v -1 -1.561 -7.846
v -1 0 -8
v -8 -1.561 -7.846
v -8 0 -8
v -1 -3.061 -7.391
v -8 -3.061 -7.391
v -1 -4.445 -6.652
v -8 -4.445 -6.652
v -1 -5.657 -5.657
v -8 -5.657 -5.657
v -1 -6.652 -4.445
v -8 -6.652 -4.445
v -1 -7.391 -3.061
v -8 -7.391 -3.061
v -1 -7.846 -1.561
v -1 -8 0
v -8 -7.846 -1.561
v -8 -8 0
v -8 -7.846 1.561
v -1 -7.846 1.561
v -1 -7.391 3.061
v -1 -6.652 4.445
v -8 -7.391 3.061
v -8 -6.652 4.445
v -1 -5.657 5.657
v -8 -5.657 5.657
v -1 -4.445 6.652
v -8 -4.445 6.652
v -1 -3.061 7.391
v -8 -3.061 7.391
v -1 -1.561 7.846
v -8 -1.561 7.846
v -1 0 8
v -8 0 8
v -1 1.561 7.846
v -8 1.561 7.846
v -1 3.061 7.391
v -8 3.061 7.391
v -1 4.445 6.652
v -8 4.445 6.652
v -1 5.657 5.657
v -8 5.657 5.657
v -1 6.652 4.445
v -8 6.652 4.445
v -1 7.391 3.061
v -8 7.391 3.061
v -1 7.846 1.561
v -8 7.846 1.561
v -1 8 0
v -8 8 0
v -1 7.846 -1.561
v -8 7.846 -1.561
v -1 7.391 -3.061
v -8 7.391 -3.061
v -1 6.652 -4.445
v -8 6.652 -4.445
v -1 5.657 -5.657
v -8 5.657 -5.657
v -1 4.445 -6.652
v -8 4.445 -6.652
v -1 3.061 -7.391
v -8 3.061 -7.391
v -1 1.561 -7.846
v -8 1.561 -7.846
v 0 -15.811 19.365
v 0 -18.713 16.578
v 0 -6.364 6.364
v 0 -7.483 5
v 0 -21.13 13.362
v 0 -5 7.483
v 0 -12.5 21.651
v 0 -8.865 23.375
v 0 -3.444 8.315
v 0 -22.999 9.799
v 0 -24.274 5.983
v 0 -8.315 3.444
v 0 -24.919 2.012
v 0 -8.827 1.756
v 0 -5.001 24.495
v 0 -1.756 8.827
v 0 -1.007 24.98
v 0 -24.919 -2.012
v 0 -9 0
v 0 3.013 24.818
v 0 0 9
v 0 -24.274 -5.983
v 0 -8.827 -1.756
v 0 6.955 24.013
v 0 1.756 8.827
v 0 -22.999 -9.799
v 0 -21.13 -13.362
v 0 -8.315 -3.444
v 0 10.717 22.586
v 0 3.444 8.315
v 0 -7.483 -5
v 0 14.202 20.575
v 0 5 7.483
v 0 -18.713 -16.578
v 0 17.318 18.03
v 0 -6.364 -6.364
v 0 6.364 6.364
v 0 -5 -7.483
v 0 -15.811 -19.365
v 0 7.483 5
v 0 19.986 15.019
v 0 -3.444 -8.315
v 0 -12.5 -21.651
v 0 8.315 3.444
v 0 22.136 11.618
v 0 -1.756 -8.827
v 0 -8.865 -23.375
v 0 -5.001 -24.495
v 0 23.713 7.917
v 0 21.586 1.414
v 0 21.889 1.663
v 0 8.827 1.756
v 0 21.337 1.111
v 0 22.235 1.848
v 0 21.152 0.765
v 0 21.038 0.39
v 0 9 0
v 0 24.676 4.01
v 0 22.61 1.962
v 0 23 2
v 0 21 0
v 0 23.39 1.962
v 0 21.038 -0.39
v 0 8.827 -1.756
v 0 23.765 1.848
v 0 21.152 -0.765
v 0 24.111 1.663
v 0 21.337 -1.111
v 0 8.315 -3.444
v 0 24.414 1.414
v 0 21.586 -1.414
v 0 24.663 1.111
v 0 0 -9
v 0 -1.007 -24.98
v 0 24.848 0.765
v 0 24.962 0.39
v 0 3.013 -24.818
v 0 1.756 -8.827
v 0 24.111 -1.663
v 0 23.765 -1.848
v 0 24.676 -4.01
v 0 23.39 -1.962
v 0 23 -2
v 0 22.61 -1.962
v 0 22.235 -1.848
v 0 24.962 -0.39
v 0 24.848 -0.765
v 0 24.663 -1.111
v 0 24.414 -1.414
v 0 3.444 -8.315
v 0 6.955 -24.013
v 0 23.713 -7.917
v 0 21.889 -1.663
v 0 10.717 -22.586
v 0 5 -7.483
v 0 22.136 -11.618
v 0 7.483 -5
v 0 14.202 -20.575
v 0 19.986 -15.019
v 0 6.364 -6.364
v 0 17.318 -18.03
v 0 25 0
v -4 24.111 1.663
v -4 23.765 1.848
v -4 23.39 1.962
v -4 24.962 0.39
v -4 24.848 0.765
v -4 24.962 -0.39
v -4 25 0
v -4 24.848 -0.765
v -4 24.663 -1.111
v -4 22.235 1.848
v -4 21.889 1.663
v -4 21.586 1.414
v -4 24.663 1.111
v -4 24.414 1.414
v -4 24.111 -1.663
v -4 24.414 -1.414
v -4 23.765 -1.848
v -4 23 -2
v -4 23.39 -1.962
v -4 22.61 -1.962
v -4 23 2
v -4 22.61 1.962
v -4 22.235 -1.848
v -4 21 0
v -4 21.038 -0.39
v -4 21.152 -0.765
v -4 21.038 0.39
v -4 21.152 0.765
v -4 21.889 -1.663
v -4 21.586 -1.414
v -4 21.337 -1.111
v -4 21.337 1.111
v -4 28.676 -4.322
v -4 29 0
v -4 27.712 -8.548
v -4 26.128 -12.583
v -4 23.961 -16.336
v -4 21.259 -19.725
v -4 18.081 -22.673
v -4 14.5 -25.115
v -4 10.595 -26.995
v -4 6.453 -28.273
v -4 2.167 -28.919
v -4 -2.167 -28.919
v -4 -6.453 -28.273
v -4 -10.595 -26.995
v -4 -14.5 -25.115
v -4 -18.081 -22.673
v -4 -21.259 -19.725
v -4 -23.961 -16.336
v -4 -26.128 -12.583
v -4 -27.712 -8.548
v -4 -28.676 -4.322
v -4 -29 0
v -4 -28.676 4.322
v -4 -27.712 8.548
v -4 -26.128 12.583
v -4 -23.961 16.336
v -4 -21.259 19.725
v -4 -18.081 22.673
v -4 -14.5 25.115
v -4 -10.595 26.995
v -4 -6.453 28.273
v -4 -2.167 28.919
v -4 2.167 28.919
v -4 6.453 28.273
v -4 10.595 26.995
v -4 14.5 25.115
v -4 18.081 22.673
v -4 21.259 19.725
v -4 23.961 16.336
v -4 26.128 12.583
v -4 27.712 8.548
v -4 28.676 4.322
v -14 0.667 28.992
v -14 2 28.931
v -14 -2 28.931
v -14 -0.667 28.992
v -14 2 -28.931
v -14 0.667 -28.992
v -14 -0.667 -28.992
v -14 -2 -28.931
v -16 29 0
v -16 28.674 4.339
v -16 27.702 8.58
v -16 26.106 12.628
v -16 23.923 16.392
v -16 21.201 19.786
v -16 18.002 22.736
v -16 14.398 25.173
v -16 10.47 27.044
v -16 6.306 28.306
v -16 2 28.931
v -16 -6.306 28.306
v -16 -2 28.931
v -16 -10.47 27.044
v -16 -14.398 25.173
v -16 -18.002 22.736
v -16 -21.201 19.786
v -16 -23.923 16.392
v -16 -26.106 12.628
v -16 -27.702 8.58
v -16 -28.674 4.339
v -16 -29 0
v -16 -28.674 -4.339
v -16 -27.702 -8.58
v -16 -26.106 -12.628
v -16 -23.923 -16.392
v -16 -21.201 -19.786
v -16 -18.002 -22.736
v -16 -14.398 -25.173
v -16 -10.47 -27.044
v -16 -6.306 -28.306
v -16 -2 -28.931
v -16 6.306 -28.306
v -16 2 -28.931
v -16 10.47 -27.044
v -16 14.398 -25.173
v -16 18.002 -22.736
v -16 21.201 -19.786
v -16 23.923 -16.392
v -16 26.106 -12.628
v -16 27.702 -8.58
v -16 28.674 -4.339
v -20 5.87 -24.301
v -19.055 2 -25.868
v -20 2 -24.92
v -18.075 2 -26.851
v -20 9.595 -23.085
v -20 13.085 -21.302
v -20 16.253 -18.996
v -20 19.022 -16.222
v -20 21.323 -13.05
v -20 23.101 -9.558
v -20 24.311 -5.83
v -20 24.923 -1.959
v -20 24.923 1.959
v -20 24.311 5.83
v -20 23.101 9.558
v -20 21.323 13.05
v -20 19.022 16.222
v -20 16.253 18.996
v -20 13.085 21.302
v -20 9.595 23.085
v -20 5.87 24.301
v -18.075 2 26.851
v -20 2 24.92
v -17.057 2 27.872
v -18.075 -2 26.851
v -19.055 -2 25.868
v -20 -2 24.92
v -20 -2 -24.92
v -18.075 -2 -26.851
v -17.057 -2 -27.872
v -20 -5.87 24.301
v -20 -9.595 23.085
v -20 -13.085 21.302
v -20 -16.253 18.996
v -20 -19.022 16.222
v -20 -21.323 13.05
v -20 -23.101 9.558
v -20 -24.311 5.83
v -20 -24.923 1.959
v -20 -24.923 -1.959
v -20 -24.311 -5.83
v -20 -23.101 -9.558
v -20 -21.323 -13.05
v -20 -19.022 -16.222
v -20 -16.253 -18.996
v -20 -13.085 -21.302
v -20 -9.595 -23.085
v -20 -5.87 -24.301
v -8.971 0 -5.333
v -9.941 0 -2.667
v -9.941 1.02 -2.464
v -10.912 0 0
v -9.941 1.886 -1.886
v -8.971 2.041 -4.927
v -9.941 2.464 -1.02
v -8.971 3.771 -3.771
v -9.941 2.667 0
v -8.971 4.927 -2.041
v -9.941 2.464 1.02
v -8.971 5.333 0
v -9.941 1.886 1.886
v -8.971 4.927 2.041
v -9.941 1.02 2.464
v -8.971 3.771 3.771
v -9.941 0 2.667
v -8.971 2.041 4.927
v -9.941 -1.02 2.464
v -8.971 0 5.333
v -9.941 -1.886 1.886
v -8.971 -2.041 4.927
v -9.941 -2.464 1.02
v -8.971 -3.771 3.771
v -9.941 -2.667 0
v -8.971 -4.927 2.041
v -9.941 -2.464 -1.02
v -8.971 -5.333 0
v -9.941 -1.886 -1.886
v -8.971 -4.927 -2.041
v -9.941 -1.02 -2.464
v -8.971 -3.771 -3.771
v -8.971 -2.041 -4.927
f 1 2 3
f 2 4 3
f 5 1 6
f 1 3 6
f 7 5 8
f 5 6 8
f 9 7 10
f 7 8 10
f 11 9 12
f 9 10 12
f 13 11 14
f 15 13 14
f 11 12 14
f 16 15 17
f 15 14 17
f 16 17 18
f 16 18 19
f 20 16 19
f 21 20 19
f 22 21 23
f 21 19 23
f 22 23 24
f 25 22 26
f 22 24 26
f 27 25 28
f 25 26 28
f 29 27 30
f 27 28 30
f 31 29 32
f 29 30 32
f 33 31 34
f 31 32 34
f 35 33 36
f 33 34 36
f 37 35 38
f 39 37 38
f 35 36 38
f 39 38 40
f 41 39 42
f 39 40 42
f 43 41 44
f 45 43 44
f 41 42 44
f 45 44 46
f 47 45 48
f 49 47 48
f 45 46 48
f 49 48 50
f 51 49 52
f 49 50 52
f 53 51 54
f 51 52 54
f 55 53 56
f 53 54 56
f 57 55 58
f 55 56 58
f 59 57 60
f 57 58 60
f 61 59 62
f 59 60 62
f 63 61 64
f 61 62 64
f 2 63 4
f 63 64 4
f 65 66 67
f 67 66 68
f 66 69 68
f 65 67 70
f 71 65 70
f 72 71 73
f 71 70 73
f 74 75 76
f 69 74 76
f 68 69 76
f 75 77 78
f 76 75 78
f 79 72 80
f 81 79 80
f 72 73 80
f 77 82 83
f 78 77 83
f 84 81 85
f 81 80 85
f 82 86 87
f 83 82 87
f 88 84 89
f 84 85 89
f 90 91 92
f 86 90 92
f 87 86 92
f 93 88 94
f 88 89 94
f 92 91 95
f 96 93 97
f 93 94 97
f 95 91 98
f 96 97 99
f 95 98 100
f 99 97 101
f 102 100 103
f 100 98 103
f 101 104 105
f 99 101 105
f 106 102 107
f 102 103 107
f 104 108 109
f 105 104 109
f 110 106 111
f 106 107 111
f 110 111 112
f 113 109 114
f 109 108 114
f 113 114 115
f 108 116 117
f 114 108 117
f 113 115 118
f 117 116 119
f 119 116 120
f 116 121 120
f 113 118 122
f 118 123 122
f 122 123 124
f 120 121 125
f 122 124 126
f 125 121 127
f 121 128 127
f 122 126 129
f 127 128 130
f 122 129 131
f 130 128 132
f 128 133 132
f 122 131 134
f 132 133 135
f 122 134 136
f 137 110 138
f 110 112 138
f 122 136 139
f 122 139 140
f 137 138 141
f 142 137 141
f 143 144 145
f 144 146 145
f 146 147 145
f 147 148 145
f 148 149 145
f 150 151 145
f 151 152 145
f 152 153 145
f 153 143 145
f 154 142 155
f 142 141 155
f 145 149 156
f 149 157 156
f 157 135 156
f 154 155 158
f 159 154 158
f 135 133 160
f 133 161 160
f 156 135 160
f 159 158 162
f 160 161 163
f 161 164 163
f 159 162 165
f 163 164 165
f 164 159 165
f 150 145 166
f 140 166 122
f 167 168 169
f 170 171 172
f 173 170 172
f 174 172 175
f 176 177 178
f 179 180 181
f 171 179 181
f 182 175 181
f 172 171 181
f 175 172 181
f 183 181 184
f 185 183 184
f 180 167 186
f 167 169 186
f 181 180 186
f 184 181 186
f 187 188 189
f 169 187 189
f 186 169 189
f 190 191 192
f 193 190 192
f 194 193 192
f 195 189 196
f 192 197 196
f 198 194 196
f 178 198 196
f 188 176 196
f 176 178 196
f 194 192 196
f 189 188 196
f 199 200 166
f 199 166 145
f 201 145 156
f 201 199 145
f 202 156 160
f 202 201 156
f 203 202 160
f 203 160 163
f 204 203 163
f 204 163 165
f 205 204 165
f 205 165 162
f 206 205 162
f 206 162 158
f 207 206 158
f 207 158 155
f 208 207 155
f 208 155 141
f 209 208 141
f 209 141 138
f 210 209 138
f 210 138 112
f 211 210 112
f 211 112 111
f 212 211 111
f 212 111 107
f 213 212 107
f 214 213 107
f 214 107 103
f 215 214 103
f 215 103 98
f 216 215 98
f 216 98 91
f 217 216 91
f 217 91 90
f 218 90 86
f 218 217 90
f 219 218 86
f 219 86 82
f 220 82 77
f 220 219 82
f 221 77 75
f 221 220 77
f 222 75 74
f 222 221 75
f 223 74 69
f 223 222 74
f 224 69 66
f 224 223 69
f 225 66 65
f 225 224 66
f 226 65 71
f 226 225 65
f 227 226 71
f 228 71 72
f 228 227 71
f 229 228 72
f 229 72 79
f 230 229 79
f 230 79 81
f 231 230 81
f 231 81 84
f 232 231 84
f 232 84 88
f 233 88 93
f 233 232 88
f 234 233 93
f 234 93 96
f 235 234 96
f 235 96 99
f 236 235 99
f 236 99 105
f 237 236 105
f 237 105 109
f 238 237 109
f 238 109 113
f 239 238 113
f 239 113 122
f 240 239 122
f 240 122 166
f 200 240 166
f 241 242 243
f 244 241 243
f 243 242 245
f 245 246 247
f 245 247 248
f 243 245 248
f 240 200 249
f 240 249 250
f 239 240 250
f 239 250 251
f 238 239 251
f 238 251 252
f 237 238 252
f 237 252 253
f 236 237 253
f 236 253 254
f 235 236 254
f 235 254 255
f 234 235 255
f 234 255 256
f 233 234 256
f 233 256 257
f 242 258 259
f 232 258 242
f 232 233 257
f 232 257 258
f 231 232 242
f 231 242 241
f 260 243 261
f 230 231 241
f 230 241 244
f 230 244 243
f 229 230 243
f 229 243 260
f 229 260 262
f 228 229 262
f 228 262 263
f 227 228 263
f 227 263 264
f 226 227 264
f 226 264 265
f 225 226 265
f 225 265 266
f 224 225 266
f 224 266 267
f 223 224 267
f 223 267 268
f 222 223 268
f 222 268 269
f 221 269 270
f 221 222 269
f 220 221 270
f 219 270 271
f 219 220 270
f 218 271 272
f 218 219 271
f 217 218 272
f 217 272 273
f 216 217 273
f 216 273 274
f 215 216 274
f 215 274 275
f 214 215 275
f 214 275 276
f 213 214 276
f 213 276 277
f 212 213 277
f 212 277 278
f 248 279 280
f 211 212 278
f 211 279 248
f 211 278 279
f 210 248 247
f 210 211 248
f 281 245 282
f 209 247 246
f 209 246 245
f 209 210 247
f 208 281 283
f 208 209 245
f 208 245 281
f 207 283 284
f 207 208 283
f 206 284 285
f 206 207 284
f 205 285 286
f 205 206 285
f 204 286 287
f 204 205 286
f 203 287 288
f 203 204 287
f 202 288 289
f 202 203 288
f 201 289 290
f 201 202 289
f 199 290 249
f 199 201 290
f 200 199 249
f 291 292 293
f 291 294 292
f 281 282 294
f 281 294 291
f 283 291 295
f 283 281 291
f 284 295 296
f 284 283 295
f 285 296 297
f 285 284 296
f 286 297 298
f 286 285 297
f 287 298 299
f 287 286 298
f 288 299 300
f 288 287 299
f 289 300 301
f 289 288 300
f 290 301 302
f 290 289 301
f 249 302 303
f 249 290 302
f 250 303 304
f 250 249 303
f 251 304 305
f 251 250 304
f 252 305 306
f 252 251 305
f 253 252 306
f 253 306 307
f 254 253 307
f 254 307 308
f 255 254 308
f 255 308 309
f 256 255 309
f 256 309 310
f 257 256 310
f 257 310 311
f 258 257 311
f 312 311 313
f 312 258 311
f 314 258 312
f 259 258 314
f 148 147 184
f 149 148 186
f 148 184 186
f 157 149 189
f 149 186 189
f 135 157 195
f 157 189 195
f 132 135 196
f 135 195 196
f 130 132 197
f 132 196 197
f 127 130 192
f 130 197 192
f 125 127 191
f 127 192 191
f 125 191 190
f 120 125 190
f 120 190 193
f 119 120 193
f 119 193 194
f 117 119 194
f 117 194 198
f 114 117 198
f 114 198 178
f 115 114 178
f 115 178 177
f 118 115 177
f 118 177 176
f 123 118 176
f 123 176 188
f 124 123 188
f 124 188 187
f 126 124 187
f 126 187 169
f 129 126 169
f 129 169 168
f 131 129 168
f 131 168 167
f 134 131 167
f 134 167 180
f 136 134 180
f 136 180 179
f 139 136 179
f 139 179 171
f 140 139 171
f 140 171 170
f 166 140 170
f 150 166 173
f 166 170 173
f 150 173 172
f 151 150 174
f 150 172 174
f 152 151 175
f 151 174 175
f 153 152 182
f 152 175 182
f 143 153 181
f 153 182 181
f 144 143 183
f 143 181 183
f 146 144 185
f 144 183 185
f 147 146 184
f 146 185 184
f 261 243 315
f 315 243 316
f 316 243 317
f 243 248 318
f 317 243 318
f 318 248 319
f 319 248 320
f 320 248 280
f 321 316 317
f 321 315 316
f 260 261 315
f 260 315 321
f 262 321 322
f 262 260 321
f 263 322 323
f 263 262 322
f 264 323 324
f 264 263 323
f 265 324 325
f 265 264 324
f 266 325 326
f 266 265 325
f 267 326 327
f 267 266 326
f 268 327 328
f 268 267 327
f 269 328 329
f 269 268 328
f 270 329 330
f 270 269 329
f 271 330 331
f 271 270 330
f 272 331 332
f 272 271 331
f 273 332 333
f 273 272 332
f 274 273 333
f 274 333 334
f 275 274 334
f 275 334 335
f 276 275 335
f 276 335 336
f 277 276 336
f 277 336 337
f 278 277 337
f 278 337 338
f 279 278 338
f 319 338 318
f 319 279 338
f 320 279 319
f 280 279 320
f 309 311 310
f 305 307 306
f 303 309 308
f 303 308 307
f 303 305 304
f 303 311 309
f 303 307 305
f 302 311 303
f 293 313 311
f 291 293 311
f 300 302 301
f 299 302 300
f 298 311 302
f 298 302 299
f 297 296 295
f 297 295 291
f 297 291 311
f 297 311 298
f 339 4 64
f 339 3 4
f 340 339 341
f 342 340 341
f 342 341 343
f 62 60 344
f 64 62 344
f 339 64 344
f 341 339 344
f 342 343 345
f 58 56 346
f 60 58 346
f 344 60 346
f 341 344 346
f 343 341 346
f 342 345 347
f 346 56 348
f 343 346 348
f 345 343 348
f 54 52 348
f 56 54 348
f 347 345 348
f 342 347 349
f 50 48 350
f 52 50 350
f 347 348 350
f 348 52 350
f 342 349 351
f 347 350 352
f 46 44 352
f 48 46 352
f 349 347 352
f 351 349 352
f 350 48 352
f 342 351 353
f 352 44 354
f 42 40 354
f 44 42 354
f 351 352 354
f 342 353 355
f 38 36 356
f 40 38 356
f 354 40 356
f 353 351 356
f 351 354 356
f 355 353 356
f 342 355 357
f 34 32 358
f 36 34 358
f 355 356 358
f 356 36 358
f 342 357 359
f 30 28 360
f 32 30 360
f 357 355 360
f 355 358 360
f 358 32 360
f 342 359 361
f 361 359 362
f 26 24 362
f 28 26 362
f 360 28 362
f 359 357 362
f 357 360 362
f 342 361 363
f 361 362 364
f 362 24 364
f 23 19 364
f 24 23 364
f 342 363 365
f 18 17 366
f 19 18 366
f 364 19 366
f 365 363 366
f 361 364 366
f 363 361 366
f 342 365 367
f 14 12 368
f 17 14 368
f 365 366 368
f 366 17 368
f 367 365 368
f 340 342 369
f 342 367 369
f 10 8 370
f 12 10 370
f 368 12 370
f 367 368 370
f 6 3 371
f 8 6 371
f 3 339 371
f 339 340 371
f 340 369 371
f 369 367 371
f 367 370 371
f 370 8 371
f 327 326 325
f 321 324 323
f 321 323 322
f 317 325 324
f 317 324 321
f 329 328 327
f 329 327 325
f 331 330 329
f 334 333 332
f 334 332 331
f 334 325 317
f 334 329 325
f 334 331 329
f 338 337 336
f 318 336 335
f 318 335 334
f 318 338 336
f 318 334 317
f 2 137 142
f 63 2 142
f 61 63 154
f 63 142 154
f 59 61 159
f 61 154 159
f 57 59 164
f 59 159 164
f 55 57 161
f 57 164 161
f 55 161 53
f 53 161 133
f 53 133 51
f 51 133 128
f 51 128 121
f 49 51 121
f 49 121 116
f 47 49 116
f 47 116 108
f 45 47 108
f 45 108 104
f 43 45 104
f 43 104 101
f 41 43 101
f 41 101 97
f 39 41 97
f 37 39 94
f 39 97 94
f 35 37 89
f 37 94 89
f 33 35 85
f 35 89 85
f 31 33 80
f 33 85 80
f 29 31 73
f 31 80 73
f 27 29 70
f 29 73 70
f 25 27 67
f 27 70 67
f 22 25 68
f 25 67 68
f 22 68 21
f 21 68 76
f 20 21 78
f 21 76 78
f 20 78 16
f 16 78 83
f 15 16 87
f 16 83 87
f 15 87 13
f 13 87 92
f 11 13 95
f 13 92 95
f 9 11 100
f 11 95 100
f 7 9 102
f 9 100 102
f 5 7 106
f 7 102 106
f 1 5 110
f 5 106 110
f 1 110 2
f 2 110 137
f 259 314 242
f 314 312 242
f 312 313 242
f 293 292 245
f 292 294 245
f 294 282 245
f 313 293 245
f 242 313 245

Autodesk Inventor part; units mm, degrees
ref_plane "YZ Plane" through (0, 0, 0) normal (1, 0, 0) x (0, 1, 0)
ref_plane "XZ Plane" through (0, 0, 0) normal (0, 1, 0) x (-1, 0, 0)
ref_plane "XY Plane" through (0, 0, 0) normal (0, 0, 1) x (1, 0, 0)
sketch "Эскиз5" plane through (0, 0, 0) normal (0, 0, 1) x (1, 0, 0)
  line L0 (0, 0) -> (-20, 0)
  line L1 (-20, 0) -> (-20, 25)
  line L2 (-16, 29) -> (-4, 29)
  line L3 (0, 25) -> (0, 0)
  line L4 (-4, 29) -> (0, 25)
  line L5 (-16, 29) -> (-20, 25)
  point P0 (-20, 29)
  point P1 (0, 29)
  dimension "d35" = 20
  dimension "d36" = 29
  dimension "d37" = 4
  dimension "d38" = 4
  dimension "d39" = 4
  dimension "d40" = 4
revolve "Вращение3" add sketch "Эскиз5" angle 360 about axis through (0, 0, 0) along (-1, 0, 0)
sketch "Эскиз6" plane through (0, 0, 0) normal (1, 0, 0) x (0, 0, -1)
  line L0 (0, 0) -> (0, 23) construction
  dimension "d42" = 23
hole "Отверстие2" at (0, 23, 0) direction (-1, 0, 0) diameter 4 depth 4
sketch "Эскиз7" plane through (0, 0, 0) normal (1, 0, 0) x (0, 0, -1)
  point P0 (0, 0)
  point P1 (0, 0)
hole "Отверстие3" at (0, 0, 0) direction (-1, 0, 0) diameter 16 depth 8 tip angle 140 countersink diameter 18 countersink angle 90
sketch "Эскиз8" plane through (0, 0, 0) normal (0, 0, 1) x (1, 0, 0)
  line L0 (-20, -25) -> (-20, 25) construction
  line L1 (-20, 2) -> (-14, 2)
  line L2 (-14, 2) -> (-14, -2)
  line L3 (-14, -2) -> (-20, -2)
  line L4 (-20, -2) -> (-20, 2)
  point P0 (0, 0)
  point P1 (-20, 0)
  point P2 (-20, 0)
  dimension "d57" = 6
  dimension "d58" = 4
extrude "Выдавливание2" cut sketch "Эскиз8" along normal through all both and the other way through all
thread "Резьба3" size "M16x2" class "6H" standard "ANSI Metric M Profile" full length
equation "\"d38\" = d37"
equation "\"d39\" = d37"
equation "\"d40\" = d39"
properties part number "711137"
